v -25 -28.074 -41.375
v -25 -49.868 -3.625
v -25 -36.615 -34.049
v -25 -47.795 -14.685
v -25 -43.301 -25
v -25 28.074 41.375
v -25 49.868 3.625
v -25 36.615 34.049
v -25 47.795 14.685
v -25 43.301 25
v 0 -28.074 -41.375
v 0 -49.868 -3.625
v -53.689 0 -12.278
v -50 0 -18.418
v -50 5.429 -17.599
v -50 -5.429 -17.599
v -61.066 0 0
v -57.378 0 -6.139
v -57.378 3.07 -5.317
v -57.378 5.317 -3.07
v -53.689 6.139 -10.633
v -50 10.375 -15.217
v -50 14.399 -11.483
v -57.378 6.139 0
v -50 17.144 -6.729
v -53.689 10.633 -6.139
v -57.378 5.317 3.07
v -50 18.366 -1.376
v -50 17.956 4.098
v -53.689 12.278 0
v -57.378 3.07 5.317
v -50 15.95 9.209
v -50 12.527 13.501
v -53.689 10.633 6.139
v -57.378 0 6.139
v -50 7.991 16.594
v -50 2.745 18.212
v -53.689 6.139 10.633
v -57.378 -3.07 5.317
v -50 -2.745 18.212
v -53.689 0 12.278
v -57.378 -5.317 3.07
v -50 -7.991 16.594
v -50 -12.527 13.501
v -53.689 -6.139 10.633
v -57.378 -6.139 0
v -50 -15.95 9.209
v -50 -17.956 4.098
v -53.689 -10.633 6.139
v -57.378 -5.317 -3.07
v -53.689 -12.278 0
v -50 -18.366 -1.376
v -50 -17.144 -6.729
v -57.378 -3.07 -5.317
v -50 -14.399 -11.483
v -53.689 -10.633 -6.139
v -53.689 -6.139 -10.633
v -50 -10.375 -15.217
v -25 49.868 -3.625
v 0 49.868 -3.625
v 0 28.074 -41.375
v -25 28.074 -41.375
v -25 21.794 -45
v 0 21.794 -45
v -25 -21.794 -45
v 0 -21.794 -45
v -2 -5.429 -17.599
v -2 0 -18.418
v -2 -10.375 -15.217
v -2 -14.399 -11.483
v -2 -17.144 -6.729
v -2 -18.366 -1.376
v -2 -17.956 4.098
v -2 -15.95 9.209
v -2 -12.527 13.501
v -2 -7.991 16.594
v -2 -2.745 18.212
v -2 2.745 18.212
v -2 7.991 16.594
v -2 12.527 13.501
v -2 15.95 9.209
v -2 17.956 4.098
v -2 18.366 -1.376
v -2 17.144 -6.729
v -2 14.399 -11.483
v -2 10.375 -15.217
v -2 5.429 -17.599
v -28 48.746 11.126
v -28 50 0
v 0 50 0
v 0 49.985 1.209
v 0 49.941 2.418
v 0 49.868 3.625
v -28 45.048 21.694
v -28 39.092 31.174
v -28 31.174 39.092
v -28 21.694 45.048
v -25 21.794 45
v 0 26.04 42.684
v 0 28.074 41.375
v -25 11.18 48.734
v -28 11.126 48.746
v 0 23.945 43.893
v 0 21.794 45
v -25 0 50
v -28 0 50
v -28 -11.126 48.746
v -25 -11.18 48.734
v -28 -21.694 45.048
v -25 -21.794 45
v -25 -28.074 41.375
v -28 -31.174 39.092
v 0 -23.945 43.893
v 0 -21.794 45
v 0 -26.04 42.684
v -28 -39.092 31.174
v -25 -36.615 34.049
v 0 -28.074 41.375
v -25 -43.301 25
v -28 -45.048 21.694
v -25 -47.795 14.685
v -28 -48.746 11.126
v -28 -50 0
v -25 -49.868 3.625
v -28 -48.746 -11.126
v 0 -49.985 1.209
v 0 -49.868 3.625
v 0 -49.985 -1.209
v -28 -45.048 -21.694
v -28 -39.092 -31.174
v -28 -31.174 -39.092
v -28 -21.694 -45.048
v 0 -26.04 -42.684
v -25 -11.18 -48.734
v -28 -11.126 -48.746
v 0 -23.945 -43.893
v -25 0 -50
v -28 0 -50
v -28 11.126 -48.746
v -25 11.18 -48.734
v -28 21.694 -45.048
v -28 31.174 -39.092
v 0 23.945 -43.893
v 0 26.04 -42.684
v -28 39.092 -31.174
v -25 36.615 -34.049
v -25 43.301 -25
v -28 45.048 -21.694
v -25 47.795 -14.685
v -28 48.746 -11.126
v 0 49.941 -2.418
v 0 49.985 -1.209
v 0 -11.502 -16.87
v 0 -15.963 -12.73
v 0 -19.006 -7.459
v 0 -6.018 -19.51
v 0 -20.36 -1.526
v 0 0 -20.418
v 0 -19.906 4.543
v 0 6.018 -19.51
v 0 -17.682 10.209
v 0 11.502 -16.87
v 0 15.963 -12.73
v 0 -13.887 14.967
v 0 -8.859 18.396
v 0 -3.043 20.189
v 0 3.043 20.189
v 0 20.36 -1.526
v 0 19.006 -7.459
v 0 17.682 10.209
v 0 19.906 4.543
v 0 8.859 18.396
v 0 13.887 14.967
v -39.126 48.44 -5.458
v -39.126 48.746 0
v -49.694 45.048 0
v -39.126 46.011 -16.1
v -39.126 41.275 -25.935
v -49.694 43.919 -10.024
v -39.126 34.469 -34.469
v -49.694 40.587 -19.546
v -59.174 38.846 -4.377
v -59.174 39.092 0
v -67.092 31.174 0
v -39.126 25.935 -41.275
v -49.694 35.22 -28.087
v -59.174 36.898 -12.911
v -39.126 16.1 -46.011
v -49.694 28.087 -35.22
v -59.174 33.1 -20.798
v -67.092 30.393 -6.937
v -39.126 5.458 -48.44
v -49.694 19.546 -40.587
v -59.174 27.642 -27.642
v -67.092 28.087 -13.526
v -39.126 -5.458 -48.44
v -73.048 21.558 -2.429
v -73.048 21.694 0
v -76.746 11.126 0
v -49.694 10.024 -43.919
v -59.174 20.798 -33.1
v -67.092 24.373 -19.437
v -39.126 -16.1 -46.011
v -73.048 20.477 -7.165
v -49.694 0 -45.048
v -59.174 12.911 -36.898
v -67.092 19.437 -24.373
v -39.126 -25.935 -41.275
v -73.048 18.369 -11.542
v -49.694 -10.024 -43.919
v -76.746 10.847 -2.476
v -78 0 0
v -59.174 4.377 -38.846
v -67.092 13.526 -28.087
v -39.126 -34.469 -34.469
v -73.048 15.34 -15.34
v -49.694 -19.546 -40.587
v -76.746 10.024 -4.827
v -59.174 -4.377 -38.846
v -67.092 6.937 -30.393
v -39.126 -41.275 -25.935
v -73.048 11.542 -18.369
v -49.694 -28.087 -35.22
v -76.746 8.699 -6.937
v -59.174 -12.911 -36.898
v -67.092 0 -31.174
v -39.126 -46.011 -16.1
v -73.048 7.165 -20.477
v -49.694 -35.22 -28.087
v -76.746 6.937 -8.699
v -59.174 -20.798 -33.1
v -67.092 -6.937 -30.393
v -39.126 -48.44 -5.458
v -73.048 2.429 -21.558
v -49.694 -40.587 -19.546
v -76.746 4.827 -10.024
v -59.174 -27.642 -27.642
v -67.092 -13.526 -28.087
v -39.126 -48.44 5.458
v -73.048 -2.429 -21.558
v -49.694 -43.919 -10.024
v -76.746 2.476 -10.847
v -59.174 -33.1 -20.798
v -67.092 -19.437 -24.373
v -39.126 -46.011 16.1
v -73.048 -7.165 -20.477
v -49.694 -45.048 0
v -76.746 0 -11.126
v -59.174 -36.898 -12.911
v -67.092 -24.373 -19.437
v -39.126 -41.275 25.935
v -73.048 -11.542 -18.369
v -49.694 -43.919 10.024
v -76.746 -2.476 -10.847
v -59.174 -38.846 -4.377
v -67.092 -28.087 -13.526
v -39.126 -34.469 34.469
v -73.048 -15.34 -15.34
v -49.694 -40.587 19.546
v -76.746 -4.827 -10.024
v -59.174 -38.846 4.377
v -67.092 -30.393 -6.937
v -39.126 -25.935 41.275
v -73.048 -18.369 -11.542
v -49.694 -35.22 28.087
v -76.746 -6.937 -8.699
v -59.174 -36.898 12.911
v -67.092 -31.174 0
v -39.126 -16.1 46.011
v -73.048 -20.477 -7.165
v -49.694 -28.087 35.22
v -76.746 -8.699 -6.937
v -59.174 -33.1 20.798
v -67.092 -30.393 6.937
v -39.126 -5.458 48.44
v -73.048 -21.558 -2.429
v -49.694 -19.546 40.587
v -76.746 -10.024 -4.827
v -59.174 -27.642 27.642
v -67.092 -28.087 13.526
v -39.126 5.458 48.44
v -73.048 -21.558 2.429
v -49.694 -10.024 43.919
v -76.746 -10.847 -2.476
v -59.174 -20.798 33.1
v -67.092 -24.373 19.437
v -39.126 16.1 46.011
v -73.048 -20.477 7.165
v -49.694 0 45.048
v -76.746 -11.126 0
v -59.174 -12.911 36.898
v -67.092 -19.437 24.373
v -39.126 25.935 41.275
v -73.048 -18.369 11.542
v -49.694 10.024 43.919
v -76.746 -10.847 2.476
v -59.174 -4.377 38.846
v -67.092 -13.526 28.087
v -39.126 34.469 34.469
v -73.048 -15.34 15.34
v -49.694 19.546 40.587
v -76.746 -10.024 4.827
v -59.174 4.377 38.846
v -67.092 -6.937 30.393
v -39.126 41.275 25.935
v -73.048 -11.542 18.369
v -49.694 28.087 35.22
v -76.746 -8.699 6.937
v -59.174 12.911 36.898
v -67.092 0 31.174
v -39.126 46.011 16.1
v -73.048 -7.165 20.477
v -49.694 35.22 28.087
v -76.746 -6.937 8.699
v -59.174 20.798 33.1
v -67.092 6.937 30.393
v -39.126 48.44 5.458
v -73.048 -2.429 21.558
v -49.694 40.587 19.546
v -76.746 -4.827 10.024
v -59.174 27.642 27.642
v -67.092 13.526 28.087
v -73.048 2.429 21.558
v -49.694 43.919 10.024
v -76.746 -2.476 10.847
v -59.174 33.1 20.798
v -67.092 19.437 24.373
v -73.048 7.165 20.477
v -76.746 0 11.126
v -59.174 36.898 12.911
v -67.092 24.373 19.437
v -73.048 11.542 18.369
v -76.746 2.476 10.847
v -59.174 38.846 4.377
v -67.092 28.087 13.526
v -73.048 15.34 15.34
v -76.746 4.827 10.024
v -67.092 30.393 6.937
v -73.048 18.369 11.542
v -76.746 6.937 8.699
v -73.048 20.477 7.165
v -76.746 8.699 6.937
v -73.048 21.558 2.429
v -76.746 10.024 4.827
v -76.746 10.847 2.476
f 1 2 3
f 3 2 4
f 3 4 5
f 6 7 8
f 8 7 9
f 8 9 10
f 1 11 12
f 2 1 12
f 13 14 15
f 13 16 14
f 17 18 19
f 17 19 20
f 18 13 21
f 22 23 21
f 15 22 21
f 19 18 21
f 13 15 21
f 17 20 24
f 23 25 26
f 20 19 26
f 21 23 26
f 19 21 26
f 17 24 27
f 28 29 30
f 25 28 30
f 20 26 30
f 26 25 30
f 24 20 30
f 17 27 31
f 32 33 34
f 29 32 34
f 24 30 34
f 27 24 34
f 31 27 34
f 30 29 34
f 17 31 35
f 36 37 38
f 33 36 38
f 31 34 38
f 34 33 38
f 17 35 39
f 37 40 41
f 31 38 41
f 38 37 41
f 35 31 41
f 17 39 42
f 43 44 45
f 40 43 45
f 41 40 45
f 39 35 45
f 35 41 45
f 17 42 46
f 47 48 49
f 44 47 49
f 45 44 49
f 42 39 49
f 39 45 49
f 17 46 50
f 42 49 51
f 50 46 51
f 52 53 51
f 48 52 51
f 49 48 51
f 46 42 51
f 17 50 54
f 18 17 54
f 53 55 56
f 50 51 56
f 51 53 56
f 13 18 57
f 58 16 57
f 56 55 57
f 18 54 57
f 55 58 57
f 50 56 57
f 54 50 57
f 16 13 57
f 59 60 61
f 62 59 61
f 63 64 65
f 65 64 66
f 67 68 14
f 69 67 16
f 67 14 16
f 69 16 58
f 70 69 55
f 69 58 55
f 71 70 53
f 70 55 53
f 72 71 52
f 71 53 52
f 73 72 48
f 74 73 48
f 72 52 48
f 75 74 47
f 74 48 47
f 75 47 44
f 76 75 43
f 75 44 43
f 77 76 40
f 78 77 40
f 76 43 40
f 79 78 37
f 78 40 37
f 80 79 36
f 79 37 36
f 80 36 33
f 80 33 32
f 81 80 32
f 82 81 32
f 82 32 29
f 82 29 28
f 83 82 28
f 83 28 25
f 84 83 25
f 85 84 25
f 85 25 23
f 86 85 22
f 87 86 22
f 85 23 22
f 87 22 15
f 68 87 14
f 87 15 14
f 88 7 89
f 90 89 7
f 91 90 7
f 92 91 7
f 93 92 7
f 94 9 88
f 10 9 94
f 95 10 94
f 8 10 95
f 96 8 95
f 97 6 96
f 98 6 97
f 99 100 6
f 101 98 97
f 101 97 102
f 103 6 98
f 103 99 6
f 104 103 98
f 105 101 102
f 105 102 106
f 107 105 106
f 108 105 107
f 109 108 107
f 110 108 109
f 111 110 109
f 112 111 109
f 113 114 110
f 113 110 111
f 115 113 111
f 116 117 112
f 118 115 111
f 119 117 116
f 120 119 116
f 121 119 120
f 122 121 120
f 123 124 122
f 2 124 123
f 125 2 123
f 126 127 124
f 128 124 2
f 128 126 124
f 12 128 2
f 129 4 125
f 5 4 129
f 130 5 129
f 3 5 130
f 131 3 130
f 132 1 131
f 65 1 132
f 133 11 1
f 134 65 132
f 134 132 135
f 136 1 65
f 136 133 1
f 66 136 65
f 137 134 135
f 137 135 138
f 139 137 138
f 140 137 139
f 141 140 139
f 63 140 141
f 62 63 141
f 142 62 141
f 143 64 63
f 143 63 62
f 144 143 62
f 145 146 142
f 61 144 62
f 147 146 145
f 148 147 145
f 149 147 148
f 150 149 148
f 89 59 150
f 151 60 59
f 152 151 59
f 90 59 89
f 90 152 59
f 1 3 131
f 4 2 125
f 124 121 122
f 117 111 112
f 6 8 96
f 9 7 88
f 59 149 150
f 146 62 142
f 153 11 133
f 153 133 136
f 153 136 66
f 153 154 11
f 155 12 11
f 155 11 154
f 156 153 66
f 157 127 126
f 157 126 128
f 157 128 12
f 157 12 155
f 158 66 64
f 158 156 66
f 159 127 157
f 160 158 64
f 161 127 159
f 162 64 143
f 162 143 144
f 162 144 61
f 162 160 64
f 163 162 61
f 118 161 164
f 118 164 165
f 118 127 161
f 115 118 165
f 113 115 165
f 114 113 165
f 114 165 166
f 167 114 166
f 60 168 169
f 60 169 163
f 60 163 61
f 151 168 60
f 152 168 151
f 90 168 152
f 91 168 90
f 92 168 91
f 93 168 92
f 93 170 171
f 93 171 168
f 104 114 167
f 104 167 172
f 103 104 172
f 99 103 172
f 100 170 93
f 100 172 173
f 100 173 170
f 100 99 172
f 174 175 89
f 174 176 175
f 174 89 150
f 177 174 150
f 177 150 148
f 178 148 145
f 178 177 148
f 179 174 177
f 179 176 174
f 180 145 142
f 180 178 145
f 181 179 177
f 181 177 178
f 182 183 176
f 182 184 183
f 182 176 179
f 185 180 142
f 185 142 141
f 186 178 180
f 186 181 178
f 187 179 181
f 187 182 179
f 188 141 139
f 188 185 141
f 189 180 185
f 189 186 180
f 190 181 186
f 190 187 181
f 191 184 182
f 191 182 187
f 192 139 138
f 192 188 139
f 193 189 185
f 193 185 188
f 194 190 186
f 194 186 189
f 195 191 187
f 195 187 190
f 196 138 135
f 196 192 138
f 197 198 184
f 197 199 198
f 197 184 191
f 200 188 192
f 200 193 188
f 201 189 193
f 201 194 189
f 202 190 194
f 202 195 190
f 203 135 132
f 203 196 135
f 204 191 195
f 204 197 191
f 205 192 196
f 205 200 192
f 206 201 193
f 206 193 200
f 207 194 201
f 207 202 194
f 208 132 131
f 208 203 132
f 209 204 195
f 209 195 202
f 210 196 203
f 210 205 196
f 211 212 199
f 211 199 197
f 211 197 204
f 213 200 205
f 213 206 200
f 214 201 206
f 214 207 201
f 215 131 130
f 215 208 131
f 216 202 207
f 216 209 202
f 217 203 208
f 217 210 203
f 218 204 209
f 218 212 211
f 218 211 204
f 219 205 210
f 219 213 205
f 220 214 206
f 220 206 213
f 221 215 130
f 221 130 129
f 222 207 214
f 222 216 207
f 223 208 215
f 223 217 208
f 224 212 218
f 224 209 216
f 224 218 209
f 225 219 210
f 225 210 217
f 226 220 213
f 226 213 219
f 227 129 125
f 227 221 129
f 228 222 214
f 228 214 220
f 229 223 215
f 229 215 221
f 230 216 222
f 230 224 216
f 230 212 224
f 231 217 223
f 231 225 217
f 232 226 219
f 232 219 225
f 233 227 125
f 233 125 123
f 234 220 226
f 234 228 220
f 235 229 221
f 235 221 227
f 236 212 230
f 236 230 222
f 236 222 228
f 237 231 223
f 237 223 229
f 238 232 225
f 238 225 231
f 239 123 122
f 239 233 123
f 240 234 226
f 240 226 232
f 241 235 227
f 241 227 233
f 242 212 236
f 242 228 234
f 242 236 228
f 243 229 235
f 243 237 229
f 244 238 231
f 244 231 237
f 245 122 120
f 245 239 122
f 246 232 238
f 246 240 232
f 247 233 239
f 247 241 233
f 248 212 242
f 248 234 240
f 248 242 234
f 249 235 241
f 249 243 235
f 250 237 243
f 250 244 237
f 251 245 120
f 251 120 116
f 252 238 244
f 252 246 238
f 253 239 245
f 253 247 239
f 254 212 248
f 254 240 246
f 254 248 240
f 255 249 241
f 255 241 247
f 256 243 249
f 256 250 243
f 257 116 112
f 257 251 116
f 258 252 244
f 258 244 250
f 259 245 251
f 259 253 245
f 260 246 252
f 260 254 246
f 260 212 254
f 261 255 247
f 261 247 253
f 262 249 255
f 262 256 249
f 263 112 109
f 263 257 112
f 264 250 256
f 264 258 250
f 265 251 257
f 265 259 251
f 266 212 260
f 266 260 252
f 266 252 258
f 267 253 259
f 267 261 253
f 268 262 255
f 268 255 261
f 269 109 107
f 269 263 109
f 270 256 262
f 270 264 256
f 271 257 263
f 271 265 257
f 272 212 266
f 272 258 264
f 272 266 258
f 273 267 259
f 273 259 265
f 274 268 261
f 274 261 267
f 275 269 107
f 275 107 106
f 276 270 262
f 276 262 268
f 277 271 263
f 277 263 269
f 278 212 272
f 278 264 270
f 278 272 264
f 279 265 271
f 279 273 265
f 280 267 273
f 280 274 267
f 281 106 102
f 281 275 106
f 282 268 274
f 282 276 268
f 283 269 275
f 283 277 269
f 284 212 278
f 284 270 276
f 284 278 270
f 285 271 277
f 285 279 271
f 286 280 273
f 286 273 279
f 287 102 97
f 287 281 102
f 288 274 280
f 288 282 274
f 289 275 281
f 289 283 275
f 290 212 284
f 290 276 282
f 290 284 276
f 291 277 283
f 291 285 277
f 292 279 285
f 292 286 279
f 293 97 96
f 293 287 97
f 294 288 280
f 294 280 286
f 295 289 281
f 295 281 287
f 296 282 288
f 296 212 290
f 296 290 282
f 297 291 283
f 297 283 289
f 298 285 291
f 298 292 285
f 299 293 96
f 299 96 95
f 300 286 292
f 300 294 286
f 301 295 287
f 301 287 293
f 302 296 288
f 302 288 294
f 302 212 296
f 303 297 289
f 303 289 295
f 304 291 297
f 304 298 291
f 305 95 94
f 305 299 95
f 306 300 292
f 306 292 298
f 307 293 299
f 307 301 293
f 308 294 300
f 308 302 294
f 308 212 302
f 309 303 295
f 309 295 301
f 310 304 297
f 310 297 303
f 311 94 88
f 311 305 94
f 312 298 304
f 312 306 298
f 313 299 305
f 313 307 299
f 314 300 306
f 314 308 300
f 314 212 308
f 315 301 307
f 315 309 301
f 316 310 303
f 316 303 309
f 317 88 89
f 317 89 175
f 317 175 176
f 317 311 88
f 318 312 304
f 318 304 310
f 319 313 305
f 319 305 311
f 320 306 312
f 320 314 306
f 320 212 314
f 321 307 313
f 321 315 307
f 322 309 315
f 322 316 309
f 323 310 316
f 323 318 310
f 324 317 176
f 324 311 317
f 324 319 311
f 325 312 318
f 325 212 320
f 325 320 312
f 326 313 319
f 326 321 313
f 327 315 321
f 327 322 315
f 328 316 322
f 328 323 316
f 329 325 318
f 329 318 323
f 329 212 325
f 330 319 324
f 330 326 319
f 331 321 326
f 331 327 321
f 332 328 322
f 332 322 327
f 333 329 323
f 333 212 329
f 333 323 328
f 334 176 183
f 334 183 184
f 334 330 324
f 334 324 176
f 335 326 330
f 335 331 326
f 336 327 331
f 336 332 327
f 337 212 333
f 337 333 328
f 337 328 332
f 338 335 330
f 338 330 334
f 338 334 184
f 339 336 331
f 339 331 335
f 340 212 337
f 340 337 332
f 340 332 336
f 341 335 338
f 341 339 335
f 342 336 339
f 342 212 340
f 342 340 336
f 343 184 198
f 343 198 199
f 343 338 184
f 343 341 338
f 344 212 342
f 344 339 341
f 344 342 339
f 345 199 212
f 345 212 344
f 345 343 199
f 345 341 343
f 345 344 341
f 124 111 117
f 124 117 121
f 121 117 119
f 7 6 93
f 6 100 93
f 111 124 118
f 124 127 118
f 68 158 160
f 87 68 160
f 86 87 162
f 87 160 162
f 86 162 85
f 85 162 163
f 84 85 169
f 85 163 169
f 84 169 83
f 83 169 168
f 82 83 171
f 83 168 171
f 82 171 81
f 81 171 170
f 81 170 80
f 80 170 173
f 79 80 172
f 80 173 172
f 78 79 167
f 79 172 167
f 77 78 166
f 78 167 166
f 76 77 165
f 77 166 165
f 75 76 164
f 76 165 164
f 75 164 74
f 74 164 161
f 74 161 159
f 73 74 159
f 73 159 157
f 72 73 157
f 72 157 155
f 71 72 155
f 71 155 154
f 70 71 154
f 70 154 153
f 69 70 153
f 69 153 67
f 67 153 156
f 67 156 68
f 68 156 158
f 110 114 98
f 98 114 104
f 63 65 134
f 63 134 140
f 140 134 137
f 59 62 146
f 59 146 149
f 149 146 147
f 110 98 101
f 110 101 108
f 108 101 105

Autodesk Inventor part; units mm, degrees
ref_plane "YZ Plane" through (0, 0, 0) normal (1, 0, 0) x (0, 1, 0)
ref_plane "XZ Plane" through (0, 0, 0) normal (0, 1, 0) x (-1, 0, 0)
ref_plane "XY Plane" through (0, 0, 0) normal (0, 0, 1) x (1, 0, 0)
sketch "Esboço1" plane through (0, 0, 0) normal (0, 0, 1) x (1, 0, 0)
  line L0 (0, 0) -> (-78, 0)
  arc A0 (-28, 50) -> (-78, 0) centre (-28, 0) ccw
  line L1 (-28, 50) -> (0, 50)
  line L2 (0, 50) -> (0, 0)
  line L3 (-106.0264, 0) -> (17.6711, 0) projected
  dimension "d0" = 28
  dimension "d1" = 50
  dimension "d2" = 50
revolve "Revolução1" add sketch "Esboço1" angle 360 about axis through (-10, 0, 0) along (1, 0, 0)
sketch "Esboço2" plane through (0, 0, 0) normal (1, 0, 0) x (0, 0, -1)
  point P0 (0, 0)
  point P1 (0, 0)
hole "Furo1" at (0, 0, 0) direction (-1, 0, 0) diameter 36.835 depth 50 tip angle 118 thread size "M39x2" class "6H" standard "ANSI Metric M Profile"
chamfer "Chanfro1" distance 2 angle 45 1 edges at (0, 0, 18.4175)
sketch "Esboço3" plane through (0, 0, 0) normal (1, 0, 0) x (0, 0, -1)
  circle A0 centre (0, 0) radius 50 projected
  circle A1 centre (0, 0) radius 20.4175 projected
  line L0 (45, 21.7945) -> (45, -21.7945)
  arc A2 (45, -21.7945) -> (45, 21.7945) centre (0, 0) ccw
  dimension "d14" = 45
extrude "Extrusão1" cut sketch "Esboço3" against normal blind 25 contours A0 L0 picked at (45.9189, -4.9362)
pattern_circular "Padrão circular1" count 6 over 360 about axis through (-10, 0, 0) along (1, 0, 0) of "Extrusão1"
